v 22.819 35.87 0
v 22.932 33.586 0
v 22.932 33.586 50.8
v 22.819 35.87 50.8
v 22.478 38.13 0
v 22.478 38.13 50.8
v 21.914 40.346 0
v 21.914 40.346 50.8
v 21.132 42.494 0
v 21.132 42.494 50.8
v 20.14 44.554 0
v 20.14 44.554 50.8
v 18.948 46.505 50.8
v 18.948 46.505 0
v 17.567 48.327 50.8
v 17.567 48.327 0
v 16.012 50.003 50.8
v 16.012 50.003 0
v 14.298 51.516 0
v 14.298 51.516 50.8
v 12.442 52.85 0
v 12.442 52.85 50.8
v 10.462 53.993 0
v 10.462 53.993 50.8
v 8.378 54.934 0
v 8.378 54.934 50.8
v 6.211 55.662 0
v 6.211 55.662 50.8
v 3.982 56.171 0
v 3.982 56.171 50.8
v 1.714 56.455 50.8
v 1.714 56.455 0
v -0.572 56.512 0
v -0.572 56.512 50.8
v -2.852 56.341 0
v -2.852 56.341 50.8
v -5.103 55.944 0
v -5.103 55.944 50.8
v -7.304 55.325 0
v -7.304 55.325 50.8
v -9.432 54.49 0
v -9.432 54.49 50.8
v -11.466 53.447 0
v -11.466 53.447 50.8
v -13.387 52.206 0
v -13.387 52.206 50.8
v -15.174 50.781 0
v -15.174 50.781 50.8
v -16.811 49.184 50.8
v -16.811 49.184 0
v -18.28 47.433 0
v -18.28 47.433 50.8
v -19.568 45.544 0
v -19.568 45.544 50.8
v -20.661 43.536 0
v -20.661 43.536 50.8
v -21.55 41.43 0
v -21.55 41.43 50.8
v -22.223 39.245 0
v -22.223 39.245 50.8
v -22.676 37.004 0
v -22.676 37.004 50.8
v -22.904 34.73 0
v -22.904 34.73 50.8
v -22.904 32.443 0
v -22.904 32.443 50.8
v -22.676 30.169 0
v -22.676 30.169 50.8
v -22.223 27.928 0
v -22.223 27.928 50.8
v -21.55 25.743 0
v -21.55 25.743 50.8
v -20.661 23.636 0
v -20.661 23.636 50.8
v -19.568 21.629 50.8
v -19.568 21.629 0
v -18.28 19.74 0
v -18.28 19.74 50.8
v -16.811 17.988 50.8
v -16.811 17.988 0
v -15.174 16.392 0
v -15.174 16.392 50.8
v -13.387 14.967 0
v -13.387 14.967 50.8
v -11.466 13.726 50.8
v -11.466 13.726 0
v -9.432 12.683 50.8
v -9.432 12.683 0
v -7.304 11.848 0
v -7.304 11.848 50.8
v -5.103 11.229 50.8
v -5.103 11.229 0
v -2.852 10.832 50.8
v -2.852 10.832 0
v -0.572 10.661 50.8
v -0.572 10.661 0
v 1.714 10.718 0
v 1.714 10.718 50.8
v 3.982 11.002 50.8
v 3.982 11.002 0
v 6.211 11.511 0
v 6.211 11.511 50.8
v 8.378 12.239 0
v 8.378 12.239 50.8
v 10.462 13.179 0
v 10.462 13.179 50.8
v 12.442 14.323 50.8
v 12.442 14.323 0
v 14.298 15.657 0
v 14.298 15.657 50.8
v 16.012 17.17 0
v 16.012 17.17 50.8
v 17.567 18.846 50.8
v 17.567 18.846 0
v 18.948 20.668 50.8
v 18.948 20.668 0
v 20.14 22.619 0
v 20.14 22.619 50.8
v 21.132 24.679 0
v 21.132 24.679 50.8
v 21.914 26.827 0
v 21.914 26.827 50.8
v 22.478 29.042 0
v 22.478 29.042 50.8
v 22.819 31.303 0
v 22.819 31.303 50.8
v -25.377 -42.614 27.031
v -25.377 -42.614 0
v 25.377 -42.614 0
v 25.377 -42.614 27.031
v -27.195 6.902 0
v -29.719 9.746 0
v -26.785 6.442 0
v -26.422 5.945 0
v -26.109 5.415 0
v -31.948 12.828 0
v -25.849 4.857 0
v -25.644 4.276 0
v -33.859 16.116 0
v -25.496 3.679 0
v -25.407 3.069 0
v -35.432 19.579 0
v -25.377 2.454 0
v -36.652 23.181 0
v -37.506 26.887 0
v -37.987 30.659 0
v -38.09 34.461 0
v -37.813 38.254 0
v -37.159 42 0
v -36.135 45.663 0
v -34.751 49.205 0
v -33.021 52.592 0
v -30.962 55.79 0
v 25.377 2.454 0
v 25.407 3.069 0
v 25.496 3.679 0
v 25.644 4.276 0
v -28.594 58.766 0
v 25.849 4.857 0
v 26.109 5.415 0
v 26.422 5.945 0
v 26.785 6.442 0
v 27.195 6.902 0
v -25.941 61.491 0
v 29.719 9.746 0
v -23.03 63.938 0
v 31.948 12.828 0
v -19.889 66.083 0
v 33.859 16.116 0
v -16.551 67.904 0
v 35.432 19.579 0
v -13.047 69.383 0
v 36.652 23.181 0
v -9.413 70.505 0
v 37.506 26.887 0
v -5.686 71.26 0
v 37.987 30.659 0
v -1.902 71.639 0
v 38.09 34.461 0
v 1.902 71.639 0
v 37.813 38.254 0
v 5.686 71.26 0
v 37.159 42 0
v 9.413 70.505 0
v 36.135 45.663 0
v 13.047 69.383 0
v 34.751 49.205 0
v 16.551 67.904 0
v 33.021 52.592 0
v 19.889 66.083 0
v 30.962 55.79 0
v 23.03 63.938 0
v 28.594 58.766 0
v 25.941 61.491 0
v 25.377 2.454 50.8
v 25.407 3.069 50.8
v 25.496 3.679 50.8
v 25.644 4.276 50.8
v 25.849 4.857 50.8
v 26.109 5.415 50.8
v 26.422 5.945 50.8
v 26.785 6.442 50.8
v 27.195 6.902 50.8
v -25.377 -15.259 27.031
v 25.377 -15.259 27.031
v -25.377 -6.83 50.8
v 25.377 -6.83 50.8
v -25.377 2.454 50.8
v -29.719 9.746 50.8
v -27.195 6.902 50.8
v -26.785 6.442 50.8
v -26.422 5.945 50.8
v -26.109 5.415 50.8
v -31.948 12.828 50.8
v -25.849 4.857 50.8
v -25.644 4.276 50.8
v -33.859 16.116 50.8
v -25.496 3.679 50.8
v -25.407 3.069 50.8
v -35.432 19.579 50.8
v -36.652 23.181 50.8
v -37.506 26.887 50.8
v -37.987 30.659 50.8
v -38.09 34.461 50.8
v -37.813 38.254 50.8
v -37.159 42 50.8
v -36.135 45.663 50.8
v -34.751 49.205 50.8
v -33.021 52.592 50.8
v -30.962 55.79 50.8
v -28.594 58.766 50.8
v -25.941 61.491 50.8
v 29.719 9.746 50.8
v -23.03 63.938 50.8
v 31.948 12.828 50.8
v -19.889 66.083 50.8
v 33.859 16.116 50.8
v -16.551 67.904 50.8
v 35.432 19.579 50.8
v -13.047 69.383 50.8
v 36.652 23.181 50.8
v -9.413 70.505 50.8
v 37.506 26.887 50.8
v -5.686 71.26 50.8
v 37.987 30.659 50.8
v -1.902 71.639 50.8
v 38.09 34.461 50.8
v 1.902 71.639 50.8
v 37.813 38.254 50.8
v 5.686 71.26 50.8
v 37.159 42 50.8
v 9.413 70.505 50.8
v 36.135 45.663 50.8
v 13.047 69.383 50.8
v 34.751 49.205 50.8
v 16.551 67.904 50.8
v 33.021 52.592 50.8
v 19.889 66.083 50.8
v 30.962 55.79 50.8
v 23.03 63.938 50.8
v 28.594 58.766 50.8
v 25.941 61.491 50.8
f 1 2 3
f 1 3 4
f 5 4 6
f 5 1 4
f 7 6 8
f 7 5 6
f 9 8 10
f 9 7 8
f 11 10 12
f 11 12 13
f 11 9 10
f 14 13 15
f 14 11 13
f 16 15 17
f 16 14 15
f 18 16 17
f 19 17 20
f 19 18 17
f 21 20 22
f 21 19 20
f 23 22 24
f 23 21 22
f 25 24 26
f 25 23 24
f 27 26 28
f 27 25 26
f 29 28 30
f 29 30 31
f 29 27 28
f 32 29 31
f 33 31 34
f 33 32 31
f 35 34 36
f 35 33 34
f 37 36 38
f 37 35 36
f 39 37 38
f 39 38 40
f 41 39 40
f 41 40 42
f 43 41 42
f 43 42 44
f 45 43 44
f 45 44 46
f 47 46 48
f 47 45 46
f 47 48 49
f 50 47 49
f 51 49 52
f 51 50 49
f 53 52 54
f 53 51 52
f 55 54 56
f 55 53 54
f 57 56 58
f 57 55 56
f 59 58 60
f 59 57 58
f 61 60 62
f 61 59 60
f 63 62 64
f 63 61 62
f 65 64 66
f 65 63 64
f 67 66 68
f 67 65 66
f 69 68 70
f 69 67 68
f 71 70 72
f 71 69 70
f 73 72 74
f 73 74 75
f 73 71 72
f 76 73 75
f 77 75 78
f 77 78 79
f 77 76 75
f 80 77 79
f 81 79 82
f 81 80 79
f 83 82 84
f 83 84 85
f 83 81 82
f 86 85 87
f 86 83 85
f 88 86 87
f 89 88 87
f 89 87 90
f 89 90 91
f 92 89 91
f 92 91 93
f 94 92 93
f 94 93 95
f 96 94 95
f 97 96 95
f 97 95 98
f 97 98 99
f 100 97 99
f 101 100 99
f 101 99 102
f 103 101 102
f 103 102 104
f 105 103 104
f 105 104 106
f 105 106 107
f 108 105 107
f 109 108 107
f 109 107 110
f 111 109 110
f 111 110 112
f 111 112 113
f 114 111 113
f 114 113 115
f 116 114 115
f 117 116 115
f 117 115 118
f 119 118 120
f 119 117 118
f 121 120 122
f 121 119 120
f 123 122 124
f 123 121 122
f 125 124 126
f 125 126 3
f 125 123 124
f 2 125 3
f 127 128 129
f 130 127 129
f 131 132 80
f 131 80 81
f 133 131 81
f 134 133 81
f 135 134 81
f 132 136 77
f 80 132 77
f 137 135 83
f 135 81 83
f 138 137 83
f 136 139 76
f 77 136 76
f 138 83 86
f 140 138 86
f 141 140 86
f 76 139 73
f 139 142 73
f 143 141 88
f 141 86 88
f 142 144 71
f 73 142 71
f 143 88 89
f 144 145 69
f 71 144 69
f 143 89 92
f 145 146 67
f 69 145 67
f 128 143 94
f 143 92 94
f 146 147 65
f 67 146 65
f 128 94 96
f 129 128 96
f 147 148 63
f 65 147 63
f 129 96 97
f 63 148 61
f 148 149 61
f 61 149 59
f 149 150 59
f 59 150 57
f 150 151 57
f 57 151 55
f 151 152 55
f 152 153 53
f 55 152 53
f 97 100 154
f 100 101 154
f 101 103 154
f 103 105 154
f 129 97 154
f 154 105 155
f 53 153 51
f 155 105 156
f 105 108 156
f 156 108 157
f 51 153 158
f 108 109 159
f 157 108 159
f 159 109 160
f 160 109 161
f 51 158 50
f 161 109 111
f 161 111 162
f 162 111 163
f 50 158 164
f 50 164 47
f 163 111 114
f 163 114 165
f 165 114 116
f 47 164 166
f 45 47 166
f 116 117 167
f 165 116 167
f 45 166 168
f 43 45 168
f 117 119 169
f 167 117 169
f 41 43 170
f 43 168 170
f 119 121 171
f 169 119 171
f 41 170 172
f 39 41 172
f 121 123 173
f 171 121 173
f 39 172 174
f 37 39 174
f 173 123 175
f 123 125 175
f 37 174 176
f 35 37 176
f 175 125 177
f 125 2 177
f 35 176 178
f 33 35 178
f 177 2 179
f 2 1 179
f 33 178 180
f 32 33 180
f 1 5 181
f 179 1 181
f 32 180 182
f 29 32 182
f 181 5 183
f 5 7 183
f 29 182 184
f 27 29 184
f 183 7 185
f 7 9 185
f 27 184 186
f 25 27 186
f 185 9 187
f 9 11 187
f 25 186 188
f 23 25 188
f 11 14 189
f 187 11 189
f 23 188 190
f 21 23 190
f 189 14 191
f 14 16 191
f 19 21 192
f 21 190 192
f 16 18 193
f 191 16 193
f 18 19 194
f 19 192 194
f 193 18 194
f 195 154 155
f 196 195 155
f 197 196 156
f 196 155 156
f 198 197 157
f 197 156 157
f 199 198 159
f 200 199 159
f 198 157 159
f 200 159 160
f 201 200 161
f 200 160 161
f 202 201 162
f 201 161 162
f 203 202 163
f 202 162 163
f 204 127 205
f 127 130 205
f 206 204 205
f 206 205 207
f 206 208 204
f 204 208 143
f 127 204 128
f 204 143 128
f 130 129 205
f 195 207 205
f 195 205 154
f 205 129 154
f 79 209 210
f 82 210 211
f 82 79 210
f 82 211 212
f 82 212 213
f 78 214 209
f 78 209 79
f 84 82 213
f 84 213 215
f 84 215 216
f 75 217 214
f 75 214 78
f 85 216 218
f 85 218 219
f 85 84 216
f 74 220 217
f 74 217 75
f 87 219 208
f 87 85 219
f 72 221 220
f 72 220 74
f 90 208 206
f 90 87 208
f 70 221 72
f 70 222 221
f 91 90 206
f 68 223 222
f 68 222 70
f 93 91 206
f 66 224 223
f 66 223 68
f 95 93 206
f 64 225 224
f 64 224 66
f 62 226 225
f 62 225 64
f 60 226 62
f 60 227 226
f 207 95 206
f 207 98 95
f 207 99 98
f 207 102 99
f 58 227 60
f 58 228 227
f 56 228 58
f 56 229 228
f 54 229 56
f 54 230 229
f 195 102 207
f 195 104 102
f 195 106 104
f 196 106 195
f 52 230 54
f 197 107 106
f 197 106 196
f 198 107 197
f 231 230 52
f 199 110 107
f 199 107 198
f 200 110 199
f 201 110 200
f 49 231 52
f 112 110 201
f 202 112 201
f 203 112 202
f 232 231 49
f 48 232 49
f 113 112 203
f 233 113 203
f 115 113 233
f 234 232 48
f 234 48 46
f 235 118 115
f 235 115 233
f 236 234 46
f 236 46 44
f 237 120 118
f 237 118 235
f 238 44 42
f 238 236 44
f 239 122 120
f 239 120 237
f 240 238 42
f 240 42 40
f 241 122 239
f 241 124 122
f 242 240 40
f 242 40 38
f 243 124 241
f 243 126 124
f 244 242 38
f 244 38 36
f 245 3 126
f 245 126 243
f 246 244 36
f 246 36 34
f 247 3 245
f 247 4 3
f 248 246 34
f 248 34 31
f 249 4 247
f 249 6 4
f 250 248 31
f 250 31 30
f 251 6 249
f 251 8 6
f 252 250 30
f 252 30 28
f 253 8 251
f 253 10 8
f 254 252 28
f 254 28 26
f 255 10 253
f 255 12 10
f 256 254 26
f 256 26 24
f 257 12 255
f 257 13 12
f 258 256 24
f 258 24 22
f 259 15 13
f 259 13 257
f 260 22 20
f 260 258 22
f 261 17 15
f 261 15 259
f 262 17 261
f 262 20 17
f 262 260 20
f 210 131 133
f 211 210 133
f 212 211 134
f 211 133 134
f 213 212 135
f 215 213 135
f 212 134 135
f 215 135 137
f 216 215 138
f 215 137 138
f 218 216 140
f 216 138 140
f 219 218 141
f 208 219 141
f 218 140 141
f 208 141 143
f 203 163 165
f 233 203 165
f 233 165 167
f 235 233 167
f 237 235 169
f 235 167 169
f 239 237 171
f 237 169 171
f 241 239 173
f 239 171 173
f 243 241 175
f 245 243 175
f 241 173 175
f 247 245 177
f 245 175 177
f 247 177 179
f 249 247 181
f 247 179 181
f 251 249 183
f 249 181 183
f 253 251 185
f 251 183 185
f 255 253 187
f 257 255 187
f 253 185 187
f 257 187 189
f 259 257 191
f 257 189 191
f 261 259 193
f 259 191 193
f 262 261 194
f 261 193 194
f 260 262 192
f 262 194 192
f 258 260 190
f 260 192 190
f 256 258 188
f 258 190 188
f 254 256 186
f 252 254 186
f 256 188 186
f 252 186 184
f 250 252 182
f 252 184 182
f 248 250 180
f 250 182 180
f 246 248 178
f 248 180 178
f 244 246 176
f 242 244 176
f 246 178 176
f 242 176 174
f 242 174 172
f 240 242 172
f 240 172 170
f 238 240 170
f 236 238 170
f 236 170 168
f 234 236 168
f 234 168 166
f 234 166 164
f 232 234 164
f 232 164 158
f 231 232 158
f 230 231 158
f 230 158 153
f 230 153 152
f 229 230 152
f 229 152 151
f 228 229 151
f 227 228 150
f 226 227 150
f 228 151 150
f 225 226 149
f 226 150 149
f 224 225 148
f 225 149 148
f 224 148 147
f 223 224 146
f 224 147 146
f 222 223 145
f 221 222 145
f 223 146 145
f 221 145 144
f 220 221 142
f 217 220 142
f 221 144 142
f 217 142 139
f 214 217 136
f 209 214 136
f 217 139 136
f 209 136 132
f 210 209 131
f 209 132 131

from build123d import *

# Parameters (mm, degrees)
F0_R     = 22.932499
F1_DEPTH = 50.8
F3_DEPTH = 38.1


with BuildPart() as f1:
    # F0 (on Top) → F1 (new body)
    with BuildSketch(Plane.XY):
        with BuildLine():
            ThreePointArc((25.377046, 2.454483), (25.848974, 4.856726), (27.194611, 6.901902))
            ThreePointArc((27.194611, 6.901902), (0, 71.686413), (-27.194611, 6.901902))
            ThreePointArc((-27.194611, 6.901902), (-25.848974, 4.856726), (-25.377046, 2.454483))
            Line((-25.377046, 2.454483), (-25.377046, -42.613587))
            Line((-25.377046, -42.613587), (25.377046, -42.613587))
            Line((25.377046, -42.613587), (25.377046, 2.454483))
        make_face()
        with Locations((0, 33.586413)):
            Circle(F0_R, mode=Mode.SUBTRACT)
    extrude(amount=F1_DEPTH)

    # F2 (on Right) → F3 (cut, symmetric)
    with BuildSketch(Plane.YZ):
        Polygon((-47.515366, 27.248772), (-42.938434, 27.030824), (-15.25889, 27.030824), (-4.361433, 57.761654), (-47.515366, 57.761654), align=None)
    extrude(amount=F3_DEPTH, both=True, mode=Mode.SUBTRACT)


solid = f1.part
